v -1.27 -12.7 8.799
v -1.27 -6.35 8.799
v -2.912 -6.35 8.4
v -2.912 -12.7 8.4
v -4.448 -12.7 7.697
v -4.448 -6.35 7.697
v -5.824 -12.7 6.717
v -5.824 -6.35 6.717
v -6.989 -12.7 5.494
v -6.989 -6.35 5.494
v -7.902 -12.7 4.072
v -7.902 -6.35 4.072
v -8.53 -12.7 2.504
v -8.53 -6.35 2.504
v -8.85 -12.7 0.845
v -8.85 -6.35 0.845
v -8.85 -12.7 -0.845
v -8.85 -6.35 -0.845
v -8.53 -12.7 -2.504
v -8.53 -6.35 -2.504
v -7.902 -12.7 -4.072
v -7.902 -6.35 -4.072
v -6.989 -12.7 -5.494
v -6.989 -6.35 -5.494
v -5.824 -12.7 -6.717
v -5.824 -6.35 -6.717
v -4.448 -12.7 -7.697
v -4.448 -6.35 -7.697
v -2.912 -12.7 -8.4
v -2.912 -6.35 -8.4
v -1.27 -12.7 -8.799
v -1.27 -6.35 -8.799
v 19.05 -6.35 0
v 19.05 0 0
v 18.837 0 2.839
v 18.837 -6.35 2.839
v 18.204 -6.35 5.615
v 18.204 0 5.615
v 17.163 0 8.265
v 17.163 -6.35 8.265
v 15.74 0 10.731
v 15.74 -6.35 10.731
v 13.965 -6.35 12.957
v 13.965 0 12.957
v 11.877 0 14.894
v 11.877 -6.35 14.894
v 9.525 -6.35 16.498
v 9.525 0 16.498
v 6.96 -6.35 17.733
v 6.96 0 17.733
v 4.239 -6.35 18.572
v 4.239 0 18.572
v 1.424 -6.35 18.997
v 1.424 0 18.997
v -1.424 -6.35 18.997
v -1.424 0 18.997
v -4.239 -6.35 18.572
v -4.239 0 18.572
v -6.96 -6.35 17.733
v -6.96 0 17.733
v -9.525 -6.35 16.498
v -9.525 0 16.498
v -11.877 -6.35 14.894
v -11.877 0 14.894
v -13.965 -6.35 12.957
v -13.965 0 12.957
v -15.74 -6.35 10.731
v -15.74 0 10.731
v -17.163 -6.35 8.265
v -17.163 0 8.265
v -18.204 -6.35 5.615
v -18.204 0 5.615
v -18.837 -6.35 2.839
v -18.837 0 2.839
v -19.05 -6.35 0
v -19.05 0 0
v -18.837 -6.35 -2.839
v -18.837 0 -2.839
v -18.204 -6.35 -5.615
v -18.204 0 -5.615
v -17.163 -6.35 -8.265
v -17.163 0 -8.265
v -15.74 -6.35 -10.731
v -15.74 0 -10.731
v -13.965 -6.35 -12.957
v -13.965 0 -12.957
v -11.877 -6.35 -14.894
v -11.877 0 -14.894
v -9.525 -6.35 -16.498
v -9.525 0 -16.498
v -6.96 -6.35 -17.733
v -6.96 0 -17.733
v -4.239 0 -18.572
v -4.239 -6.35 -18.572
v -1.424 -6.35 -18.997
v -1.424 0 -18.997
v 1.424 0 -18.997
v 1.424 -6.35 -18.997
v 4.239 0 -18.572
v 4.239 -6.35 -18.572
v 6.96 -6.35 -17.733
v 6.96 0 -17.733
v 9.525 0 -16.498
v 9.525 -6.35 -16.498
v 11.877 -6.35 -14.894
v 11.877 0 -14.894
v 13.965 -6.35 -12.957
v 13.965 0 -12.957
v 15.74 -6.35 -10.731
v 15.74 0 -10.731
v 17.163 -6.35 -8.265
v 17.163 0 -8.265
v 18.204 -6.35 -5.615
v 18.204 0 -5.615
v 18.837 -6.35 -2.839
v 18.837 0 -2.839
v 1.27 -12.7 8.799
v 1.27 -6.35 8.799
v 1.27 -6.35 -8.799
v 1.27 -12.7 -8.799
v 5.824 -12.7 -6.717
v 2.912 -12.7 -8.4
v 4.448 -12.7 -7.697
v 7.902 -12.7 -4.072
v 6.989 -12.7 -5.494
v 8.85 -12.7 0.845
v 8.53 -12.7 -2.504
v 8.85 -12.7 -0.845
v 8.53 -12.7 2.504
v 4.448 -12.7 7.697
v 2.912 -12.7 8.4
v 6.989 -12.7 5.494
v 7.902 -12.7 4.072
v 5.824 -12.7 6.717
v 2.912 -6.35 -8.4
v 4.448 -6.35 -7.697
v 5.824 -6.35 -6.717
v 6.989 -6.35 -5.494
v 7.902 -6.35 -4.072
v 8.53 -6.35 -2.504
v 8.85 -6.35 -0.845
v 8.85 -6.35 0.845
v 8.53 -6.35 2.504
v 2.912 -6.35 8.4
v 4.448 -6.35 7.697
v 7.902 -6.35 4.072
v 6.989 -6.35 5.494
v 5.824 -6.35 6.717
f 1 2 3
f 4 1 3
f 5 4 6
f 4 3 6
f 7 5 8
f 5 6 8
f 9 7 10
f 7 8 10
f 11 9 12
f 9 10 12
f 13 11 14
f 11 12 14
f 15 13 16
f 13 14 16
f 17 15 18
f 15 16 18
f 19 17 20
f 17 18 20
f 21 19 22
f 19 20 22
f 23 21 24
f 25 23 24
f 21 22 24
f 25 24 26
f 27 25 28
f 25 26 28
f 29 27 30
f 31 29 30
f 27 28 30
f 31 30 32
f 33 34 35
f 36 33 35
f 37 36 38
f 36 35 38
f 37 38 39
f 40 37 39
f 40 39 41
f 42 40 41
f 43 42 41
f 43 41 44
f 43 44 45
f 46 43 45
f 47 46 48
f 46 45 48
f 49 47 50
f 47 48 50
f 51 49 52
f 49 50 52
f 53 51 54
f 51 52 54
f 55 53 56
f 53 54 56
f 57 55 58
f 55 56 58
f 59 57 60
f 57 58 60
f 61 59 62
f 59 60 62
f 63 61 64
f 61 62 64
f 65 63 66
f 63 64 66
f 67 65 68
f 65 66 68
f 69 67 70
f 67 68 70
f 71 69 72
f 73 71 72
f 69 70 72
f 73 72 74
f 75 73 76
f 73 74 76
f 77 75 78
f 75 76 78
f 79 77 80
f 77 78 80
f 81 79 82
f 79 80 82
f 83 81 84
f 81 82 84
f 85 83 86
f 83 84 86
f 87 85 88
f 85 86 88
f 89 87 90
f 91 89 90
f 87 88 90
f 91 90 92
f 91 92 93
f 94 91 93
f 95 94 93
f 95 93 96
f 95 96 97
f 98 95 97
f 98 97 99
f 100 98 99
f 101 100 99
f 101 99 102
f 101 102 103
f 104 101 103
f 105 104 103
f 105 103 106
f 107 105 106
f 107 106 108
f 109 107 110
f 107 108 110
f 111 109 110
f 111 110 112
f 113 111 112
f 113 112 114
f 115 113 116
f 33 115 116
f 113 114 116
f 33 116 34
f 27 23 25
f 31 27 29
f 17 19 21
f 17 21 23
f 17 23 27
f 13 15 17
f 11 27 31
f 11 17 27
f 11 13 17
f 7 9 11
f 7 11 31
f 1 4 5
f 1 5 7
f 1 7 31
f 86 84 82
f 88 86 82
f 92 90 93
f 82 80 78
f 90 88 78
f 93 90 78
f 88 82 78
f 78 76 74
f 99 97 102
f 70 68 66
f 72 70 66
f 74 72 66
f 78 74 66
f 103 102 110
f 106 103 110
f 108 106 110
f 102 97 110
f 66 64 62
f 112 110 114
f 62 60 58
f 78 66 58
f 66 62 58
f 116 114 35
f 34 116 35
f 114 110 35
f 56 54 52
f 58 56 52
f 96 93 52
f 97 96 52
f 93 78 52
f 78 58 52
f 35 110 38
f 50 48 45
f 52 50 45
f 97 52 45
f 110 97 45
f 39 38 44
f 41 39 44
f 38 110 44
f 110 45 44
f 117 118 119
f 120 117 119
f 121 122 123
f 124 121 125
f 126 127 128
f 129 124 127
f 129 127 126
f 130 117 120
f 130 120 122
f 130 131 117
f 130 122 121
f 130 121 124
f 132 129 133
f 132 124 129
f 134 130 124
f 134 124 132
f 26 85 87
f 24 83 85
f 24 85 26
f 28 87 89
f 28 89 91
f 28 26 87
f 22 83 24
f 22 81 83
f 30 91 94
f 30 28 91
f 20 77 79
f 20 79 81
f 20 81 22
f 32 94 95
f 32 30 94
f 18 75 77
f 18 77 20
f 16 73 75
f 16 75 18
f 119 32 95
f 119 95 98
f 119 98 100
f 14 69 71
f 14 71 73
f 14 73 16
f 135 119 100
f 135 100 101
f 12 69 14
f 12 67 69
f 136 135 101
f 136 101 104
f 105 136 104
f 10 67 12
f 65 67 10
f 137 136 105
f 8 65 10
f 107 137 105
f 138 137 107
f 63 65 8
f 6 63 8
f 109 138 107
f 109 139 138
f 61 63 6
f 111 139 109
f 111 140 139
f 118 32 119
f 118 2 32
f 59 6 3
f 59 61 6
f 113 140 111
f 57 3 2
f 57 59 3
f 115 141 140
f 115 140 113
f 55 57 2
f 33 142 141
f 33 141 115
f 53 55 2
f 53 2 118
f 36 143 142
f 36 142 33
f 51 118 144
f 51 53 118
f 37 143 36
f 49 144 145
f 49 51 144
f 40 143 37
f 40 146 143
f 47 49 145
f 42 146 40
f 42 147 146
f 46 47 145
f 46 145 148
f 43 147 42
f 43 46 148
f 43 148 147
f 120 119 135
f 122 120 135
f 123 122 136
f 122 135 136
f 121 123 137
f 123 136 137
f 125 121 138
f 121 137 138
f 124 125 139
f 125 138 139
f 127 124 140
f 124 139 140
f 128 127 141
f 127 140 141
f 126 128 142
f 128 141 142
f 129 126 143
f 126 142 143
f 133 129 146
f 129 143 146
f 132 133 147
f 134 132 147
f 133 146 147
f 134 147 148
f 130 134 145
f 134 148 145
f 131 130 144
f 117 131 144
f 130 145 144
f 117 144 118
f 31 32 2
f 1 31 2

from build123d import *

# Parameters (mm, degrees)
F0_R     = 19.05
F1_DEPTH = 6.35
F3_DEPTH = 38.1
F4_DEPTH = 25.4


with BuildPart() as f1:
    # F0 (on Front) → F1 (new body)
    with BuildSketch(Plane.XZ):
        Circle(F0_R)
    extrude(amount=F1_DEPTH)

    # F2 (on Front) → F3 (join)
    with BuildSketch(Plane.XZ):
        with BuildLine():
            Line((-1.27, -8.798818), (-1.27, 8.798818))
            ThreePointArc((-1.27, 8.798818), (-8.89, 0), (-1.27, -8.798818))
        make_face()
        with BuildLine():
            ThreePointArc((1.27, -8.798818), (8.89, 0), (1.27, 8.798818))
            Line((1.27, 8.798818), (1.27, -8.798818))
        make_face()
    extrude(amount=F3_DEPTH)

    # F3_face (on face) → F4 (cut)
    with BuildSketch(Plane(origin=(4.46805, -38.1, 0), x_dir=(1, 0, 0), z_dir=(0, -1, 0))):
        with BuildLine():
            Line((-3.19805, 8.798818), (-3.19805, -8.798818))
            ThreePointArc((-3.19805, -8.798818), (4.42195, 0), (-3.19805, 8.798818))
        make_face()
        with BuildLine():
            Line((-5.73805, -8.798818), (-5.73805, 8.798818))
            ThreePointArc((-5.73805, 8.798818), (-13.35805, 0), (-5.73805, -8.798818))
        make_face()
    extrude(amount=-F4_DEPTH, mode=Mode.SUBTRACT)


solid = f1.part
